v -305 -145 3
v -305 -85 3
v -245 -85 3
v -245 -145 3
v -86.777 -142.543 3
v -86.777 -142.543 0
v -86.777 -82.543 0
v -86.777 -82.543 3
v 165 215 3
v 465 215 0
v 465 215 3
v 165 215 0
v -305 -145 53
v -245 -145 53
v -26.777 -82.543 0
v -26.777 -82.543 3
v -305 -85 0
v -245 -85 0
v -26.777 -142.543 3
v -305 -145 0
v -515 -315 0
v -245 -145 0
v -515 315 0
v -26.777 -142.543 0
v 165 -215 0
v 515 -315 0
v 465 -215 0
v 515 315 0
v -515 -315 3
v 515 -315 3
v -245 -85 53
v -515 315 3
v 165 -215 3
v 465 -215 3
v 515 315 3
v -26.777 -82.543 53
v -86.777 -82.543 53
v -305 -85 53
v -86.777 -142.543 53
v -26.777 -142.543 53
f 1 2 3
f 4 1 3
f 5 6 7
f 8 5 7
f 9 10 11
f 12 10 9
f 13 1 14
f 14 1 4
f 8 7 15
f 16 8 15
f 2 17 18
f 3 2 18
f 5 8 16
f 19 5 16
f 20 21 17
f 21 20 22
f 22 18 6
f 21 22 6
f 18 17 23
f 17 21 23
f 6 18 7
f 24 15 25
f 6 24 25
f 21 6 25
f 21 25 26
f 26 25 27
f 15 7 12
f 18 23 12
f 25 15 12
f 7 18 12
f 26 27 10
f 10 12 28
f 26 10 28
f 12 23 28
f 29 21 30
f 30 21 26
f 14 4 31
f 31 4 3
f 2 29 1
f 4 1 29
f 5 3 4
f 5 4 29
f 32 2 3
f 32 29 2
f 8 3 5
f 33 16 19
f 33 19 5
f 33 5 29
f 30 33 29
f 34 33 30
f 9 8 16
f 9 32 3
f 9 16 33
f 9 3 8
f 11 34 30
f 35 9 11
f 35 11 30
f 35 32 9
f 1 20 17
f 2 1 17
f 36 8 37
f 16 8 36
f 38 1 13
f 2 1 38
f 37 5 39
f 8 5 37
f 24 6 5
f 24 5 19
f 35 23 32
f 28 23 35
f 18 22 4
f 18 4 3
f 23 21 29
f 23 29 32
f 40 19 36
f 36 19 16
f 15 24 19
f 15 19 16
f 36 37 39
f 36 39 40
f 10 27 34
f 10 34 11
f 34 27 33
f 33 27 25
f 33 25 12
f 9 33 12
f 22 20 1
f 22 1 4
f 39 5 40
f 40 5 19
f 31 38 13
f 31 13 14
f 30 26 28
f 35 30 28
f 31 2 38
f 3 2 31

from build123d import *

# Parameters (mm, degrees)
ESQUISSE1_W                  = 1030
ESQUISSE1_H                  = 630
BOSS_EXTRU_1_DEPTH           = 3
ESQUISSE2_W                  = 300
ESQUISSE2_H                  = 430
ENL_V_MAT_EXTRU_1_DEPTH      = 10
ENL_V_MAT_EXTRU_2_DEPTH      = 604.704397864
ENL_V_MAT_EXTRU_2_DEPTH_BACK = 604.704397864
ESQUISSE3_W                  = 60
ESQUISSE3_H                  = 60
ESQUISSE4_W                  = 60
ESQUISSE4_H                  = 60
BOSS_EXTRU_2_DEPTH           = 50
BOSS_EXTRU_2_2_DEPTH         = 50


with BuildPart() as part:
    # Esquisse1 → Boss.-Extru.1 (new body)
    with BuildSketch(Plane.XY):
        Rectangle(ESQUISSE1_W, ESQUISSE1_H)
    extrude(amount=BOSS_EXTRU_1_DEPTH)

    # Esquisse2 → Enlèv. mat.-Extru.1 (cut)
    with BuildSketch(Plane(origin=(0, 0, 0), x_dir=(-1, 0, 0), z_dir=(0, 0, -1))):
        with Locations((-315, 0)):
            Rectangle(ESQUISSE2_W, ESQUISSE2_H)
    extrude(amount=-ENL_V_MAT_EXTRU_1_DEPTH, mode=Mode.SUBTRACT)

    # Esquisse3 → Enlèv. mat.-Extru.2 (cut, two sides: drawn at the far end of the back side and taken through both)
    with BuildSketch(Plane.XY.offset(3).offset(-ENL_V_MAT_EXTRU_2_DEPTH_BACK)):
        with Locations((-275, -115)):
            Rectangle(ESQUISSE3_W, ESQUISSE3_H)
        with Locations((-56.776559507, -112.543167667)):
            Rectangle(ESQUISSE3_W, ESQUISSE3_H)
    extrude(amount=ENL_V_MAT_EXTRU_2_DEPTH + ENL_V_MAT_EXTRU_2_DEPTH_BACK, mode=Mode.SUBTRACT)


with BuildPart() as body_2:
    # Esquisse4 → Boss.-Extru.2 (new body)
    with BuildSketch(Plane.XY.offset(3)):
        with Locations((-275, -115)):
            Rectangle(ESQUISSE4_W, ESQUISSE4_H)
    extrude(amount=BOSS_EXTRU_2_DEPTH)


with BuildPart() as body_3:
    # Esquisse4 → Boss.-Extru.2 2 (new body)
    with BuildSketch(Plane.XY.offset(3)):
        with Locations((-56.776559507, -112.543167667)):
            Rectangle(ESQUISSE4_W, ESQUISSE4_H)
    extrude(amount=BOSS_EXTRU_2_2_DEPTH)


solid = Compound([part.part, body_2.part, body_3.part])
